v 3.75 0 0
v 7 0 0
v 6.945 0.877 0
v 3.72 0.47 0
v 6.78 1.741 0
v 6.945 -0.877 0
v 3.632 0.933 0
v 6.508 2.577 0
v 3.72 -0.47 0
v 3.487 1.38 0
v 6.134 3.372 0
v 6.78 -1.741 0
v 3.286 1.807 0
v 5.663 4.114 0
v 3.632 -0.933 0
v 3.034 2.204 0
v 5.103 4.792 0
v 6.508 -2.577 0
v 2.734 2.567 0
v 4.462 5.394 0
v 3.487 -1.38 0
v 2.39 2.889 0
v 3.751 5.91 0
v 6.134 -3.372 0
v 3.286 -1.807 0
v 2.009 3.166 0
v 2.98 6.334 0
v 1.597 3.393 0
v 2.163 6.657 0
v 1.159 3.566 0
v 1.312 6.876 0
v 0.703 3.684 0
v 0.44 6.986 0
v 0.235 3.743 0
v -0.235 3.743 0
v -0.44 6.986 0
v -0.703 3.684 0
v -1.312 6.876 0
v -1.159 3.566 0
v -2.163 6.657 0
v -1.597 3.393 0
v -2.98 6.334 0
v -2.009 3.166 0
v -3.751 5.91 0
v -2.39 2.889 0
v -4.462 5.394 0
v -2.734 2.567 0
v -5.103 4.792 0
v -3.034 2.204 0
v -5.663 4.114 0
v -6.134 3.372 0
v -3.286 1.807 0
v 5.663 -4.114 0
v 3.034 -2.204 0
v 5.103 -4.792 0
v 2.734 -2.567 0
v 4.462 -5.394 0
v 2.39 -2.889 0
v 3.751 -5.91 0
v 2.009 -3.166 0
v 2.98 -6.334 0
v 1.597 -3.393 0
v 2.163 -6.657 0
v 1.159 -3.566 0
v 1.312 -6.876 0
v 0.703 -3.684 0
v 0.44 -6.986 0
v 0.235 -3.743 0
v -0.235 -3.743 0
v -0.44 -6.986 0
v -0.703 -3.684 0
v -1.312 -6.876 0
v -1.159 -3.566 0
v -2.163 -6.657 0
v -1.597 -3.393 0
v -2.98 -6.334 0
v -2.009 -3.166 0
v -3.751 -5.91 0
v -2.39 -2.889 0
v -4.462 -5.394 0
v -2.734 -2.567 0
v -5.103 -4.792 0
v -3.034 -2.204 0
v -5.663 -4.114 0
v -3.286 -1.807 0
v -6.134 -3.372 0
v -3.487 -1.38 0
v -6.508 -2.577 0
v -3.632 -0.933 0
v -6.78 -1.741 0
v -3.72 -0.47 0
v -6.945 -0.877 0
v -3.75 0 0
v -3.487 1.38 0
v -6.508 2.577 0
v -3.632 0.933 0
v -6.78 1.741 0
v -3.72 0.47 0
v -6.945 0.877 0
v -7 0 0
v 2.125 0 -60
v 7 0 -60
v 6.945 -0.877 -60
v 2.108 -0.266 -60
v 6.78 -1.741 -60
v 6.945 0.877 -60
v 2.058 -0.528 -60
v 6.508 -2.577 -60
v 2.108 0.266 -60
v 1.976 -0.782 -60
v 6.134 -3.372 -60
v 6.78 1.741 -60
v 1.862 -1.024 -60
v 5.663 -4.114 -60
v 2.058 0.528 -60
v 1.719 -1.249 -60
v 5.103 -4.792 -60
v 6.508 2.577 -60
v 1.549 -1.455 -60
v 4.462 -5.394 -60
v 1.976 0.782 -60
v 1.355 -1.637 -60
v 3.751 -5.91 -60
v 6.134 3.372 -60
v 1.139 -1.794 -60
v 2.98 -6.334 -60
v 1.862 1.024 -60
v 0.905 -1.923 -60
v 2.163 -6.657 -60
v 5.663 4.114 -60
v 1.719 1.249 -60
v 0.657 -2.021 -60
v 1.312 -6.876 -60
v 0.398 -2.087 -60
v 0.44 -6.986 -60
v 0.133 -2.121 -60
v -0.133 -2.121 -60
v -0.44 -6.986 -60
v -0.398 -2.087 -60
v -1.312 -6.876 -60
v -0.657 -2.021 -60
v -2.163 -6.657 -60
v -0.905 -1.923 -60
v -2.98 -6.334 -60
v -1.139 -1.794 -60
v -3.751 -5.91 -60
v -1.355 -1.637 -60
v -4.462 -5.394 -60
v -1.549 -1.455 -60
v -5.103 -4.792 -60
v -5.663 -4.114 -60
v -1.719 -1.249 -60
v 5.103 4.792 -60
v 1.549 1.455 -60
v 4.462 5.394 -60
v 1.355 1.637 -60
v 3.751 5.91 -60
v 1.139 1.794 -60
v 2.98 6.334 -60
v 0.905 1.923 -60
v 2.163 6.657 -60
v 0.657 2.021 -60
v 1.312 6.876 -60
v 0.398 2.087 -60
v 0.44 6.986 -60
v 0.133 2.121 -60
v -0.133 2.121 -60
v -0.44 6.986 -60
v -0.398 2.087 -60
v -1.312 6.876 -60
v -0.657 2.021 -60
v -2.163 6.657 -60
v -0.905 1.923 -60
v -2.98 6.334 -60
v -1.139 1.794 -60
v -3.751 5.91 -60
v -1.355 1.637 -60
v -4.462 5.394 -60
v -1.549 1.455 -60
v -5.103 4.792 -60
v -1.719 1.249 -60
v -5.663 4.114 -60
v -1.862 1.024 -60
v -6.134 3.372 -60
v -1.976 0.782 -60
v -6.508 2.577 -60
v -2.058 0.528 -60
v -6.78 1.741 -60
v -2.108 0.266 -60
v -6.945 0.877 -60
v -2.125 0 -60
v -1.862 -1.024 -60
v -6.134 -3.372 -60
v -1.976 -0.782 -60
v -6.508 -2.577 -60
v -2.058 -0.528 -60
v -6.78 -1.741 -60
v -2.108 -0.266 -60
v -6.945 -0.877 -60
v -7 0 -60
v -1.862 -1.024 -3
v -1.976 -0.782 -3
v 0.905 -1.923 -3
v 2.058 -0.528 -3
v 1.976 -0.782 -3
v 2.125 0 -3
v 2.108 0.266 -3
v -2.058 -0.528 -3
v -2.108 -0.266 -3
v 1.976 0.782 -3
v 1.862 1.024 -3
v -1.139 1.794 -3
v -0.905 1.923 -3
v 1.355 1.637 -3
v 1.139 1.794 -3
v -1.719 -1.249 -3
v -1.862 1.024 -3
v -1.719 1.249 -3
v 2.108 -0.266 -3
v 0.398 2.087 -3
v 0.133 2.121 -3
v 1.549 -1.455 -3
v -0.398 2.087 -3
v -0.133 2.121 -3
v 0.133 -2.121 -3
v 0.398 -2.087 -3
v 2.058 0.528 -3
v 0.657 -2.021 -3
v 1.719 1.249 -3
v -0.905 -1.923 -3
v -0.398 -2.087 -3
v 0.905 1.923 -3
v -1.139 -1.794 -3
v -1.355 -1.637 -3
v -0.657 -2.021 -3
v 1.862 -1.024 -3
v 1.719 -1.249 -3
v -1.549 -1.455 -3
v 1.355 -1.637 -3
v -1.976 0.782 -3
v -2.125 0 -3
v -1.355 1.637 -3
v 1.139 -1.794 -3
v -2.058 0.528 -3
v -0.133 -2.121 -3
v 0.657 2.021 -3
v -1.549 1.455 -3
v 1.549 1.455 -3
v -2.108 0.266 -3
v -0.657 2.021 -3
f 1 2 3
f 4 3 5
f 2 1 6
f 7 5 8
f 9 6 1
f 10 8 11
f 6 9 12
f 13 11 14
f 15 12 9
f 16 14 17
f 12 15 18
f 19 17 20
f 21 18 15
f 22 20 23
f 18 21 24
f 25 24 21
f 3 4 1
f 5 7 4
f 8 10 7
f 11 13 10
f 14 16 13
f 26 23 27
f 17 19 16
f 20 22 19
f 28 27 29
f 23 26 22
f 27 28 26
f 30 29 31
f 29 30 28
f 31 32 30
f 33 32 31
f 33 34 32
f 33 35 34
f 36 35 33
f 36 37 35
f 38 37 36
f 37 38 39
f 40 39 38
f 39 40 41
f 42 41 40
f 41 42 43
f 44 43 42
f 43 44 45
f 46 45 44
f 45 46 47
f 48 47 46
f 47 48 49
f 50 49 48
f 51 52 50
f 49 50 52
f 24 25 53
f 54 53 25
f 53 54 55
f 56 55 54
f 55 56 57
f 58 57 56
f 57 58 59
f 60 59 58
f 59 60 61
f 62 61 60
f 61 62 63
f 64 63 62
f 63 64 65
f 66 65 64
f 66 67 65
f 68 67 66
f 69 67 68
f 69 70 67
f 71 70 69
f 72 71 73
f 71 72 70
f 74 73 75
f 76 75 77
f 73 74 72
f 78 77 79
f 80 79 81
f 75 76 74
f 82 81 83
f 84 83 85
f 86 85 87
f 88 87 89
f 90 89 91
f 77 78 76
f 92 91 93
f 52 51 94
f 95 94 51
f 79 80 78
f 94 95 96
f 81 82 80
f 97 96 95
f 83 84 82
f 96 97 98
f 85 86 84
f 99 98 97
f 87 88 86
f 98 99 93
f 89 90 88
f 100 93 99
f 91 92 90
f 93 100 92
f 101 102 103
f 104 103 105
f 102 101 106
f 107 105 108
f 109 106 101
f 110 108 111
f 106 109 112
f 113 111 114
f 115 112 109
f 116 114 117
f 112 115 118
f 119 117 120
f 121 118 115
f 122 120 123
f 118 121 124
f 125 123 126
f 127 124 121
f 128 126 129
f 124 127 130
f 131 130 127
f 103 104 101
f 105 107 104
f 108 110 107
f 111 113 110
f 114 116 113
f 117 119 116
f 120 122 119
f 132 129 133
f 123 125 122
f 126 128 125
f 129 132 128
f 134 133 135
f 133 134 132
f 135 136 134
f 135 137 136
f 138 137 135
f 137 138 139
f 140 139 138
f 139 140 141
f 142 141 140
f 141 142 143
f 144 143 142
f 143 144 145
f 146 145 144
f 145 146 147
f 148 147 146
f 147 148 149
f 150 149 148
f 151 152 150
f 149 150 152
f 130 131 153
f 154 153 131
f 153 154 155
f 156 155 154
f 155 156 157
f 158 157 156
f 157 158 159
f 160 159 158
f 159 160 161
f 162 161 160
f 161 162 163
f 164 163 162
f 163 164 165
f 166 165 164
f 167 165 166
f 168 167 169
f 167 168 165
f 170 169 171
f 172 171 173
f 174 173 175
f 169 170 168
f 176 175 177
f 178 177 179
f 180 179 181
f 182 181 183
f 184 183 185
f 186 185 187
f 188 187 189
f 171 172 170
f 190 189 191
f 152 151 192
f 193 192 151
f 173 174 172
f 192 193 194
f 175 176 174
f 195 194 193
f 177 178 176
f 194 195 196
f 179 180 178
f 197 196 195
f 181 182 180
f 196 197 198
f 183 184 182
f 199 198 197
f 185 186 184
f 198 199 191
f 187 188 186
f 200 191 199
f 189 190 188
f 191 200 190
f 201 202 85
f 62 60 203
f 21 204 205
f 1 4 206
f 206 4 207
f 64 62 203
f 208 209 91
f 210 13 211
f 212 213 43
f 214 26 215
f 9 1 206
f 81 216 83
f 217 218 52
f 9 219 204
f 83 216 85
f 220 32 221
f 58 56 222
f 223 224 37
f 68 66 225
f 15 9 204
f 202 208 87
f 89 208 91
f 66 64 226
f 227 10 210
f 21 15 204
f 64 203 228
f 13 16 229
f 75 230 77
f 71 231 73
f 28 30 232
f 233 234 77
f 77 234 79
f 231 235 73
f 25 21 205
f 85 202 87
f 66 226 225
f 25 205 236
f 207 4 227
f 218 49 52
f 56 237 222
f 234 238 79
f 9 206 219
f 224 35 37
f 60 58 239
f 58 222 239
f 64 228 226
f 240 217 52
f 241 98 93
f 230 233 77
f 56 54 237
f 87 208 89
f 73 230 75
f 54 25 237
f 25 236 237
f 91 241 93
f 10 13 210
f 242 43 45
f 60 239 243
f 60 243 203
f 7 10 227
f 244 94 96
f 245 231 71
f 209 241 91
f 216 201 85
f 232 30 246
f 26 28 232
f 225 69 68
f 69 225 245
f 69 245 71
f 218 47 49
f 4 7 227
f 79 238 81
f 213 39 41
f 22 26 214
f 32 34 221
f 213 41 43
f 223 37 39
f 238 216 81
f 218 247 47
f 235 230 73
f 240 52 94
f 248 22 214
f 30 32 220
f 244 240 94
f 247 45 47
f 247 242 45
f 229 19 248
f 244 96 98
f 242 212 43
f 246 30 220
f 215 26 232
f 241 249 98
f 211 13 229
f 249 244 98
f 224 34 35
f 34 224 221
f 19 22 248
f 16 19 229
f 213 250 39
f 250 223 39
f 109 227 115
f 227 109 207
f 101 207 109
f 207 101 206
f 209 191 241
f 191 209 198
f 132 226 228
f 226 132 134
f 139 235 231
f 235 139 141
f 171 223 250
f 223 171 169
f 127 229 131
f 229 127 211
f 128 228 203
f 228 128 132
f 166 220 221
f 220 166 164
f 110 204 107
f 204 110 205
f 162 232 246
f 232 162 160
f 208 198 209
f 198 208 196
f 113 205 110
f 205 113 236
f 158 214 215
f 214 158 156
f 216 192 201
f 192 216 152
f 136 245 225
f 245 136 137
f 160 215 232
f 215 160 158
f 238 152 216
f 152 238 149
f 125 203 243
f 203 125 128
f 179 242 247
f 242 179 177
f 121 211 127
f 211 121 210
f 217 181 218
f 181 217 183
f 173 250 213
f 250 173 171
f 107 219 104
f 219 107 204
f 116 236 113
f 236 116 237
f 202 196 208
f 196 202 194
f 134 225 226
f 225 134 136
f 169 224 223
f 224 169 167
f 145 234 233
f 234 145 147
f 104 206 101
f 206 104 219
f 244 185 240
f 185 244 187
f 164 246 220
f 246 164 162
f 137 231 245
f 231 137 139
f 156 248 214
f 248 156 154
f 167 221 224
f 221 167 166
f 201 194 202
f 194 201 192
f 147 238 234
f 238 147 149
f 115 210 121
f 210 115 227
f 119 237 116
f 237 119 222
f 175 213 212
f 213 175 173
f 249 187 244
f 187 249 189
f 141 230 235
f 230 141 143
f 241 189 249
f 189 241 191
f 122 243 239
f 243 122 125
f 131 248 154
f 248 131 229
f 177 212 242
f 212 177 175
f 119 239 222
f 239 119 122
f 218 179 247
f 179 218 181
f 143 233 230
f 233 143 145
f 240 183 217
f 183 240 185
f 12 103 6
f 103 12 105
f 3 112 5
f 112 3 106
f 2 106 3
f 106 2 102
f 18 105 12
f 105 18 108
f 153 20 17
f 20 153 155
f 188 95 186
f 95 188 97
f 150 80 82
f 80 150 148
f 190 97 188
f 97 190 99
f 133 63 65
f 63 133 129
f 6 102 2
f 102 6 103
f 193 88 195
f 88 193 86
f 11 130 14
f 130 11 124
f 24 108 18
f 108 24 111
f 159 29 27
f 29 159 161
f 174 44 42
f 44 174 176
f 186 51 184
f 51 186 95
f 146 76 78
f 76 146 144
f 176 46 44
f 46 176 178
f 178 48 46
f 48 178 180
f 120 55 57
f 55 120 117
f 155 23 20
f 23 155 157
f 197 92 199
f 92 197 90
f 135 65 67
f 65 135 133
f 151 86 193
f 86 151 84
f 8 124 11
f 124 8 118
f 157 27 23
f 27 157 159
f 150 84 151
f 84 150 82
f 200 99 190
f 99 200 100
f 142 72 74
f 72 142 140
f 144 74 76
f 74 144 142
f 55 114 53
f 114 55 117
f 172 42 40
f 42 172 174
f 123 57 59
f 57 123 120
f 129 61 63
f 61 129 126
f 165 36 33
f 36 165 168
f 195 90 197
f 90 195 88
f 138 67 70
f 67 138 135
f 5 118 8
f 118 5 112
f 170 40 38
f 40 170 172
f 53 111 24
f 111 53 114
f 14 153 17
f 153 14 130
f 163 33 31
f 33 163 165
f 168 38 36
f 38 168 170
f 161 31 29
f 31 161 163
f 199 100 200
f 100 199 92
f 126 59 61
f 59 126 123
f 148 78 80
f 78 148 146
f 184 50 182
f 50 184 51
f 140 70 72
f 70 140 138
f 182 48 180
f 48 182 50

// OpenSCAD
$fn = 50;


difference() {
	union() {
		translate(v = [0, 0, -60.0000000000]) {
			cylinder(h = 60, r = 7.0000000000);
		}
		cylinder(h = 0, r = 10.0000000000);
	}
	union() {
		translate(v = [0, 0, 0]) {
			rotate(a = [0, 0, 0]) {
				difference() {
					union() {
						#translate(v = [0, 0, -60.0000000000]) {
							cylinder(h = 60, r = 2.0000000000);
						}
						#translate(v = [0, 0, -3]) {
							cylinder(h = 3, r1 = 2.1250000000, r2 = 3.7500000000);
						}
						#translate(v = [0, 0, -60.0000000000]) {
							cylinder(h = 60, r = 2.1250000000);
						}
						#translate(v = [0, 0, -60.0000000000]) {
							cylinder(h = 60, r = 2.0000000000);
						}
					}
					union();
				}
			}
		}
	}
}
